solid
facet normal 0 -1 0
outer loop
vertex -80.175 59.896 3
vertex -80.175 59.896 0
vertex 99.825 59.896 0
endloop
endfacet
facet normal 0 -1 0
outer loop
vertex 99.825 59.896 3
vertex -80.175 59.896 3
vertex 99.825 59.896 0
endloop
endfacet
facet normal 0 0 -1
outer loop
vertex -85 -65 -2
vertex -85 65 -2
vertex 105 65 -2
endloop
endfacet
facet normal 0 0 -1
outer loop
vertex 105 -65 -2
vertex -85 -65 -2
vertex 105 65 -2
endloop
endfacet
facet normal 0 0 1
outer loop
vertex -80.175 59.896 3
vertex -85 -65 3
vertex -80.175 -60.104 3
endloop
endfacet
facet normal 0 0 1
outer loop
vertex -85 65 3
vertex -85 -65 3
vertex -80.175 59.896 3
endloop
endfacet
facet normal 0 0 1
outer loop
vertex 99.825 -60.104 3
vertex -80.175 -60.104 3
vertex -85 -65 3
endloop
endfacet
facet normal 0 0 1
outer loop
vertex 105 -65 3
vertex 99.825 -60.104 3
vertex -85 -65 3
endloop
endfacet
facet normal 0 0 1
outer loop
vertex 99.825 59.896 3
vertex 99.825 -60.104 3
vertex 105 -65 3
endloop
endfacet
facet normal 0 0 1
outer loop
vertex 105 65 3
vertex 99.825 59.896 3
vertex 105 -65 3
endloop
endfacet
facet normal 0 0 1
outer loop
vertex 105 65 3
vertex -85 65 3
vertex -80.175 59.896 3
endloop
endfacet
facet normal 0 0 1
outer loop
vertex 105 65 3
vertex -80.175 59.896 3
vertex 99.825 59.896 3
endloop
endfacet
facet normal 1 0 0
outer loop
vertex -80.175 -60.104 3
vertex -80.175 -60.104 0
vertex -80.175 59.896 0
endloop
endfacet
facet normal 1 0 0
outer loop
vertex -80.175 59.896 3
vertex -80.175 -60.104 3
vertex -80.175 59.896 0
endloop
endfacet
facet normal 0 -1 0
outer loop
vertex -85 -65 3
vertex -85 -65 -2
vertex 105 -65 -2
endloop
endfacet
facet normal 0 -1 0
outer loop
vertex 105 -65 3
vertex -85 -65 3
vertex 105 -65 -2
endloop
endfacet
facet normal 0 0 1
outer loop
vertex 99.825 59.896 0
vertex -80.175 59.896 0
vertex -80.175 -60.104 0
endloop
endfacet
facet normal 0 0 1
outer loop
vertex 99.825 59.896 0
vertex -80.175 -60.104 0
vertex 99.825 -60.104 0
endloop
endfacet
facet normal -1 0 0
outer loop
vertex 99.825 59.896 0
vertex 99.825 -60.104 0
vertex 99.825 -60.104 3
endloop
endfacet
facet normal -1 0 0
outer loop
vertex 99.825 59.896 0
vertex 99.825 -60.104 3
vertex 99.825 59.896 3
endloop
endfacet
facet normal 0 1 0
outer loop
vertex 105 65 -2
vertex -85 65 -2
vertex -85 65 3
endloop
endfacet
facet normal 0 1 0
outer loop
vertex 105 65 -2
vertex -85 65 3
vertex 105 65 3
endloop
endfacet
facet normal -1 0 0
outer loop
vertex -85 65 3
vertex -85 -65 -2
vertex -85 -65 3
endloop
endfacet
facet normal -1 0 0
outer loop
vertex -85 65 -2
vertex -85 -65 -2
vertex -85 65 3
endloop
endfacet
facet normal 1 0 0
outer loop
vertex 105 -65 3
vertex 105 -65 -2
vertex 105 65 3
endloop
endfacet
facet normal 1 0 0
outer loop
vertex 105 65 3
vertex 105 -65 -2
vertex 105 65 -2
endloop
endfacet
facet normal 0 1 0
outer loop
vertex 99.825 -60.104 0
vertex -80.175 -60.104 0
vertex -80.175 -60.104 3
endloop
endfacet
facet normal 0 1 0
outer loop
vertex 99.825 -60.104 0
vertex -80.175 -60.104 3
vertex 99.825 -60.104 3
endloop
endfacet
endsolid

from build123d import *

# Parameters (mm, degrees)
SKETCH_W     = 160
SKETCH_H     = 100
PAD_DEPTH    = 2
SKETCH001_W  = 180
SKETCH001_H  = 120
PAD001_DEPTH = 5
SKETCH006_W  = 190
SKETCH006_H  = 130
PAD006_DEPTH = 5


with BuildPart() as pcb:
    # Sketch → Pad (new body)
    with BuildSketch(Plane(origin=(-1, 1, 3), x_dir=(1, 0, 0), z_dir=(0, 0, 1))):
        with Locations((11.269221, -1.548084)):
            Rectangle(SKETCH_W, SKETCH_H)
    extrude(amount=PAD_DEPTH)


with BuildPart() as portapcb001:
    # Sketch001 → Pad001 (new body)
    with BuildSketch(Plane.XY):
        with Locations((9.825213, -0.104076)):
            Rectangle(SKETCH001_W, SKETCH001_H)
    extrude(amount=PAD001_DEPTH)

    # Cut001: cut PCB
    add(pcb.part, mode=Mode.SUBTRACT)


with BuildPart() as base:
    # Sketch006 → Pad006 (new body)
    with BuildSketch(Plane.XY.offset(-2)):
        with Locations((10, 0)):
            Rectangle(SKETCH006_W, SKETCH006_H)
    extrude(amount=PAD006_DEPTH)

    # Cut002: cut PortaPCB001
    add(portapcb001.part, mode=Mode.SUBTRACT)


solid = base.part
